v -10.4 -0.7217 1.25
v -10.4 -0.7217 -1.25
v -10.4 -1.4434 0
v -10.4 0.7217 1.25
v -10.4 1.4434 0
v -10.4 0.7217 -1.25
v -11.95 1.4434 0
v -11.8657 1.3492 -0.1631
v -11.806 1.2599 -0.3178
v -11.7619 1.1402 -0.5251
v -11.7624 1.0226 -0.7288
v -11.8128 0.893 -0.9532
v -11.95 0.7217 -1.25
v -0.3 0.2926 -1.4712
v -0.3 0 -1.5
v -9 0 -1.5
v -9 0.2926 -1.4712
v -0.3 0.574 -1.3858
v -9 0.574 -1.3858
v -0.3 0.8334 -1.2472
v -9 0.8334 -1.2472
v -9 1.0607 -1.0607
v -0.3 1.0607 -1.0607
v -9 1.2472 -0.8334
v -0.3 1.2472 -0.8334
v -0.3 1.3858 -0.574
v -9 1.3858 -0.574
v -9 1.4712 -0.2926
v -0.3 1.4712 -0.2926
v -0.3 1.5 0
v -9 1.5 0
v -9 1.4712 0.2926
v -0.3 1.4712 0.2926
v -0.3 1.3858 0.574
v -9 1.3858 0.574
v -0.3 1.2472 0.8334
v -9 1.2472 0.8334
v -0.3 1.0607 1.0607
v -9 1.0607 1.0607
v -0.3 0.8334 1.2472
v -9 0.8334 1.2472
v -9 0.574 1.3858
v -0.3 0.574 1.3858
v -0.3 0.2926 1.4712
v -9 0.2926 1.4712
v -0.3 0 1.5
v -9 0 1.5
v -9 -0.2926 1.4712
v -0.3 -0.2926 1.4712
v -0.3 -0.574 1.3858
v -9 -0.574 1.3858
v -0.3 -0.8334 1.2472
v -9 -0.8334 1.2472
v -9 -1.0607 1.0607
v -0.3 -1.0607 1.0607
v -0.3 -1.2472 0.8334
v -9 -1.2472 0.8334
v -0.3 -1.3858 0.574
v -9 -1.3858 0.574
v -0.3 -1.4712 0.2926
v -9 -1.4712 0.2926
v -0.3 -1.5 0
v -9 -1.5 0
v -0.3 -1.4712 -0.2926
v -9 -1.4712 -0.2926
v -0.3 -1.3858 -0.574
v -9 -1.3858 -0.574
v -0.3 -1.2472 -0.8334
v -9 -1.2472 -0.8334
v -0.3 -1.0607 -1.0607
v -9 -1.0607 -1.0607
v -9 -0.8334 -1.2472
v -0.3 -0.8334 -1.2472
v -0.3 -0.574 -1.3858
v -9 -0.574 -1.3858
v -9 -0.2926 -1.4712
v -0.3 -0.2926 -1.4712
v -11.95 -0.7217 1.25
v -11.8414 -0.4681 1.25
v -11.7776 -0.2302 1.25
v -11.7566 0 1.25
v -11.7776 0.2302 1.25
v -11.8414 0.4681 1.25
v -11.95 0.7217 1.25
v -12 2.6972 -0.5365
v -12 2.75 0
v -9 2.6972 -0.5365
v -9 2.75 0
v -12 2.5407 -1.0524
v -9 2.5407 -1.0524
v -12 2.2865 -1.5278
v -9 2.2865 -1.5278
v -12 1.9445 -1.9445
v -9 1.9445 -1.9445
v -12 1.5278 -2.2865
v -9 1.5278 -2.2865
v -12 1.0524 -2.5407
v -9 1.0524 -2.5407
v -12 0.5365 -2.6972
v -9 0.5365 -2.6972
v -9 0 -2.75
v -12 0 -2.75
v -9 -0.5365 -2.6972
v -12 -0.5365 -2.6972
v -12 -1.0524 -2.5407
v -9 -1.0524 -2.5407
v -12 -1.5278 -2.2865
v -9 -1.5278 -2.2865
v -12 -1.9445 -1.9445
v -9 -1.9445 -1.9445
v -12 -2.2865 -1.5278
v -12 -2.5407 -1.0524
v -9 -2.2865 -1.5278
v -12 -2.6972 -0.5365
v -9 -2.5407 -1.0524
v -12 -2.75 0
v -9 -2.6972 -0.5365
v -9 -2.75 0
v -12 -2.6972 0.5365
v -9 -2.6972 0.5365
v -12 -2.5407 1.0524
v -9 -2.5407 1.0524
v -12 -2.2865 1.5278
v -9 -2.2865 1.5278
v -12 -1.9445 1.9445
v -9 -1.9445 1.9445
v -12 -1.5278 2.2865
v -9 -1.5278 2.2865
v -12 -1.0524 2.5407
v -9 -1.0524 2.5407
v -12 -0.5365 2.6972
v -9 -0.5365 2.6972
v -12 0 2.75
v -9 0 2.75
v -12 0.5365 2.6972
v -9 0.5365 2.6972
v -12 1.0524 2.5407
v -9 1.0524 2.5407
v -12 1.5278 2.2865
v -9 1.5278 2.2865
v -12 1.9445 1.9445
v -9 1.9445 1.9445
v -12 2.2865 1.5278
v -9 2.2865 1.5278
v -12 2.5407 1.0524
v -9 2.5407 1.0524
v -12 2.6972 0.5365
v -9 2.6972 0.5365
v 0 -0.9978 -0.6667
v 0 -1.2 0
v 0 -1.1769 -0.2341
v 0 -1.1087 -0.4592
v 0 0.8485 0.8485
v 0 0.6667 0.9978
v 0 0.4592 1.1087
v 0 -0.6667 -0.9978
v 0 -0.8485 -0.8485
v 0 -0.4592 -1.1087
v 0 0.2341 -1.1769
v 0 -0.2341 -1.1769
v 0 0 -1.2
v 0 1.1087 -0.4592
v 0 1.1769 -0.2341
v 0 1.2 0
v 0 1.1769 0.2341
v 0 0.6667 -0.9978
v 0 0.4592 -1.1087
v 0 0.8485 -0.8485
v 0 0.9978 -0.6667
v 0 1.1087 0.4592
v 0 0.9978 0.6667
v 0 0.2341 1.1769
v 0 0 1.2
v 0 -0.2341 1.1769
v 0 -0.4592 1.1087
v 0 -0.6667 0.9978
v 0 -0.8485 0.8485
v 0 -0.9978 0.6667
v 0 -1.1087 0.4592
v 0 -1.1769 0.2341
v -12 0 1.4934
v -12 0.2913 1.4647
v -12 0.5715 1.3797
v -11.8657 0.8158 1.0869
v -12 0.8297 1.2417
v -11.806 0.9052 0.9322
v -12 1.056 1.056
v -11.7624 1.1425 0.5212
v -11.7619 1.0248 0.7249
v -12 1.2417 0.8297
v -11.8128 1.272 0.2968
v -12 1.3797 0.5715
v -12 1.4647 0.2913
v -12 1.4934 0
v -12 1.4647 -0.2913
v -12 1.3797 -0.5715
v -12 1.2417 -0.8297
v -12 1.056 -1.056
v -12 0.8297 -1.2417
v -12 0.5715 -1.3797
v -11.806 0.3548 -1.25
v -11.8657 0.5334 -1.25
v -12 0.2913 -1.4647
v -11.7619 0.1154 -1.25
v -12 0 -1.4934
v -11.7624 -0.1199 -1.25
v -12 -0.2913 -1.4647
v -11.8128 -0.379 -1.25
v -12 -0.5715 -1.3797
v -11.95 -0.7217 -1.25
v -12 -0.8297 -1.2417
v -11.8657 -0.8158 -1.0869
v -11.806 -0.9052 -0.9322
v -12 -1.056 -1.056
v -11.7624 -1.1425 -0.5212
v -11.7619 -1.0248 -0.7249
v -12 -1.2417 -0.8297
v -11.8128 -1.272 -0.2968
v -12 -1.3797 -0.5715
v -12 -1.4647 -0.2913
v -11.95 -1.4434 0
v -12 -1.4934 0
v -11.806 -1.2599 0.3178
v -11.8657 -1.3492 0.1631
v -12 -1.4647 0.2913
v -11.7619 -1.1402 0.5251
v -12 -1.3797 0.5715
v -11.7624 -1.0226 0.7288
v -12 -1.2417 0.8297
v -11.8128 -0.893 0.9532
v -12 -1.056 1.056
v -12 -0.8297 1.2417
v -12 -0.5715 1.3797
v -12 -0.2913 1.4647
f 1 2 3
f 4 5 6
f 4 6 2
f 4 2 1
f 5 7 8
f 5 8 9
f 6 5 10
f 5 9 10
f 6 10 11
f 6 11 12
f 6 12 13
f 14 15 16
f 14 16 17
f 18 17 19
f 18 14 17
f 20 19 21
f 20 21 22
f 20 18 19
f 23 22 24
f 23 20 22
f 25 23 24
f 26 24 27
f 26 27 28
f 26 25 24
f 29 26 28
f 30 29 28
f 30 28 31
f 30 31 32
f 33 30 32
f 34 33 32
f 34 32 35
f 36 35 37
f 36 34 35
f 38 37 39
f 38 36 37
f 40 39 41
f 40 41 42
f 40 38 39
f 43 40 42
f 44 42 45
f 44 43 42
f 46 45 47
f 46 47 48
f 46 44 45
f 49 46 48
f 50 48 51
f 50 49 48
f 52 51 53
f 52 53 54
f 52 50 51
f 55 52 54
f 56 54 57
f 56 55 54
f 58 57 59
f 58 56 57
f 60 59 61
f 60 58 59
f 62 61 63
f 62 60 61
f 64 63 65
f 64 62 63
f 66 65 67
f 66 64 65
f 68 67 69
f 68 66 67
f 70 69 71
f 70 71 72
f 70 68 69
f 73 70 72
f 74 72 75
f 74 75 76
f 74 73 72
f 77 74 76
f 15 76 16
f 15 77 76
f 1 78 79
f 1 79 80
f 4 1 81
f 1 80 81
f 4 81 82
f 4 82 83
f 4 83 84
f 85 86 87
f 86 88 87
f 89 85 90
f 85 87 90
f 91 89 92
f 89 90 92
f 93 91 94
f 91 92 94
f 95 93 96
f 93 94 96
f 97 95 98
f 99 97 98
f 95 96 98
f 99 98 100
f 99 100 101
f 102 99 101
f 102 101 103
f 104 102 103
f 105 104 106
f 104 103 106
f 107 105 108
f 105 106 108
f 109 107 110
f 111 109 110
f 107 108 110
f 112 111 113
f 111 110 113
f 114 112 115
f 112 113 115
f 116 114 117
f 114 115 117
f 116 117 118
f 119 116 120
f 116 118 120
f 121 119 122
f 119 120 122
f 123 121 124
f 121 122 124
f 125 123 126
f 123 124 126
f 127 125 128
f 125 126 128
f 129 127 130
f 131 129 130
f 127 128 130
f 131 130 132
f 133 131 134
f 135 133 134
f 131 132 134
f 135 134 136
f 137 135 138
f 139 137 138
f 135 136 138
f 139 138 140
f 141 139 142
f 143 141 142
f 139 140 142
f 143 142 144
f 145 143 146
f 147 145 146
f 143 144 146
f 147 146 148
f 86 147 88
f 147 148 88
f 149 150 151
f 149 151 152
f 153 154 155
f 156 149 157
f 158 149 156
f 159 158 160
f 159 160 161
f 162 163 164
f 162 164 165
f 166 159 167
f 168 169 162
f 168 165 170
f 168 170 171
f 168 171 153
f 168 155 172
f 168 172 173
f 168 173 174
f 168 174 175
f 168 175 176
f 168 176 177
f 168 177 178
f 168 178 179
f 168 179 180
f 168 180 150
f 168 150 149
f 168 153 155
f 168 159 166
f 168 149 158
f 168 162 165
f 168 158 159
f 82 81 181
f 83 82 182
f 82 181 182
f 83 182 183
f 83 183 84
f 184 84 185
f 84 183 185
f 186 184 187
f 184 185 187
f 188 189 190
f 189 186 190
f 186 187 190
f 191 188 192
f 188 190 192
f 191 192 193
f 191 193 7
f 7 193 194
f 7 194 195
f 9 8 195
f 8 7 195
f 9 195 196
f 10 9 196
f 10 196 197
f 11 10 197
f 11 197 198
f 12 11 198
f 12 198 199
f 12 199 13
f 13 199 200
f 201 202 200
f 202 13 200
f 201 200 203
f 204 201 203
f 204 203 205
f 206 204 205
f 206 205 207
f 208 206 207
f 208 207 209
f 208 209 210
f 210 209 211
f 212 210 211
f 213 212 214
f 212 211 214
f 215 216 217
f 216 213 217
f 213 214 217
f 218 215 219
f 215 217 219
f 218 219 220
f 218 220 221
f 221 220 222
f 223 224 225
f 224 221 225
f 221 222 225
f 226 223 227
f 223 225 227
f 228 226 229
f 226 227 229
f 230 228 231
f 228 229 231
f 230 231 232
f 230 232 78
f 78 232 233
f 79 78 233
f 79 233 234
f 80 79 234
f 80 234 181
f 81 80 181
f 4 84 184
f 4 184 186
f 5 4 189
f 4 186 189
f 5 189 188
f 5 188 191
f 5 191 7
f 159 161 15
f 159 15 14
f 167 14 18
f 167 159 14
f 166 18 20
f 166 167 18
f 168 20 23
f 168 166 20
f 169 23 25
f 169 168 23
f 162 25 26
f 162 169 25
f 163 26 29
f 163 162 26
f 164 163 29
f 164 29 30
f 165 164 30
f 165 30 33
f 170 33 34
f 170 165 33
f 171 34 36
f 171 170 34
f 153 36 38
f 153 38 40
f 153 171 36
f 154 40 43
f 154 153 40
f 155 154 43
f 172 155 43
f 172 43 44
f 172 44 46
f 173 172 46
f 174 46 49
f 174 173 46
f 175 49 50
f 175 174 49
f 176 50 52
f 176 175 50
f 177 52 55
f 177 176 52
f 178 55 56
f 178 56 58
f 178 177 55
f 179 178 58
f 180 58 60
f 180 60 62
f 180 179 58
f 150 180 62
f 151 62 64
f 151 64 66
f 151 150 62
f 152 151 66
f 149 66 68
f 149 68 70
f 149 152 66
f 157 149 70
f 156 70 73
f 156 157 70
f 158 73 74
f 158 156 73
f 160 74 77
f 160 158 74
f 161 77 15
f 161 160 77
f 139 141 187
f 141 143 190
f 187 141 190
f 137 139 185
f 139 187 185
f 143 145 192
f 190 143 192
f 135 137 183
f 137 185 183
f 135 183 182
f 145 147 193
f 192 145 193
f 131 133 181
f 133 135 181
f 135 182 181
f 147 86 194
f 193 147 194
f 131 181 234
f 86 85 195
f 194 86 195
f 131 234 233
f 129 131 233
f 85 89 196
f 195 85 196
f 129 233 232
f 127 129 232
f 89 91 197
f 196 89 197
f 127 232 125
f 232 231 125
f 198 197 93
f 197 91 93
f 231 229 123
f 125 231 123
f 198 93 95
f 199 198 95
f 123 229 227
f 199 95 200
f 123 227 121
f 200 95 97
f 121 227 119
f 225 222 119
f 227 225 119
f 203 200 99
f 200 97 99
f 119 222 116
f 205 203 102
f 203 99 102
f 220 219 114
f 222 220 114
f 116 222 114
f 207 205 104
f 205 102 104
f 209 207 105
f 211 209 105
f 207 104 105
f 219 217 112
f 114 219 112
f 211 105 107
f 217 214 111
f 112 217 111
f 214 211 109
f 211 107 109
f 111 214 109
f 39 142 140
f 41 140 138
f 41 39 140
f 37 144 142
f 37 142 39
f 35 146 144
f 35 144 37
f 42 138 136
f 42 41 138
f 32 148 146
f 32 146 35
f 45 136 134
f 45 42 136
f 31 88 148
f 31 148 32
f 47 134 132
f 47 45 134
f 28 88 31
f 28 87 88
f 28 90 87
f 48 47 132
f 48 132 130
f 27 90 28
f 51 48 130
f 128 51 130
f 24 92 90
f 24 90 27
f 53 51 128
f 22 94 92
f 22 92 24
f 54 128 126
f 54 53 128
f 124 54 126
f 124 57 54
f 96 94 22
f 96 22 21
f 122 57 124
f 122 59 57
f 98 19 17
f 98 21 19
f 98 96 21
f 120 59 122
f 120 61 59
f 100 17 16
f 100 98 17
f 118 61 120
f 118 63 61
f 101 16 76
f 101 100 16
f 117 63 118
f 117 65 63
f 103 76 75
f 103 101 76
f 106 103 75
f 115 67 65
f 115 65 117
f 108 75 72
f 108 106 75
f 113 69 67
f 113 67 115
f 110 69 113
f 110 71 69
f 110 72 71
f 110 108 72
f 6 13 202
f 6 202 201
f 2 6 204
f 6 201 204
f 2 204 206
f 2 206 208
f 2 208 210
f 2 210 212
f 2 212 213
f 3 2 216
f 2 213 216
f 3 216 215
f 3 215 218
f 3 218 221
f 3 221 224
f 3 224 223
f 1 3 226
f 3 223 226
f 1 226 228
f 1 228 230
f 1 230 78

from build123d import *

# Parameters (mm, degrees)
SKETCH2_R           = 1.5
BOSS_EXTRUDE1_DEPTH = 9
CHAMFER1_SIZE       = 0.3
SKETCH6_W           = 3
SKETCH6_H           = 2.75
CUT_EXTRUDE1_DEPTH  = 1.6
SKETCH8_R           = 1.493375673
CUT_EXTRUDE2_DEPTH  = 1
CUT_EXTRUDE2_DRAFT  = -45


with BuildPart() as part:
    # Sketch2 → Boss-Extrude1 (new body)
    with BuildSketch(Plane(origin=(0, 0, 0), x_dir=(0, 0, -1), z_dir=(1, 0, 0))):
        Circle(SKETCH2_R)
    extrude(amount=-BOSS_EXTRUDE1_DEPTH)

    # Chamfer1
    chamfer1_edges = [part.edges().sort_by_distance(p)[0] for p in [
        (0, 0, 1.5),
    ]]
    chamfer(chamfer1_edges, length=CHAMFER1_SIZE)

    # Sketch6 → Revolve1 (revolve)
    with BuildSketch(Plane.XY):
        with Locations((-10.5, 1.375)):
            Rectangle(SKETCH6_W, SKETCH6_H)
    revolve(axis=Axis((-9, 0, 0), (-1, 0, 0)))

    # Sketch7 → Cut-Extrude1 (cut)
    with BuildSketch(Plane.ZY.offset(12)):
        Polygon((0, 1.443375673), (-1.25, 0.721687836), (-1.25, -0.721687836), (0, -1.443375673), (1.25, -0.721687836), (1.25, 0.721687836), align=None)
    extrude(amount=-CUT_EXTRUDE1_DEPTH, mode=Mode.SUBTRACT)


with BuildPart() as cut_extrude2_tool:
    # Sketch8 → Cut-Extrude2 (with draft: the straight prism first)
    with BuildSketch(Plane.ZY.offset(12)):
        Circle(SKETCH8_R)
    extrude(amount=-CUT_EXTRUDE2_DEPTH)
    # Cut-Extrude2: the draft: its side faces are tilted about the plane it starts from
    cut_extrude2_sides = [cut_extrude2_tool.faces().sort_by_distance(p)[0] for p in [
        (-11.5, 0, -1.493375673),
    ]]
    draft(cut_extrude2_sides, Plane.ZY.offset(12), CUT_EXTRUDE2_DRAFT)


with BuildPart() as part_1:
    add(part.part)

    # Cut-Extrude2: cut by cut_extrude2_tool
    add(cut_extrude2_tool.part, mode=Mode.SUBTRACT)


solid = part_1.part
